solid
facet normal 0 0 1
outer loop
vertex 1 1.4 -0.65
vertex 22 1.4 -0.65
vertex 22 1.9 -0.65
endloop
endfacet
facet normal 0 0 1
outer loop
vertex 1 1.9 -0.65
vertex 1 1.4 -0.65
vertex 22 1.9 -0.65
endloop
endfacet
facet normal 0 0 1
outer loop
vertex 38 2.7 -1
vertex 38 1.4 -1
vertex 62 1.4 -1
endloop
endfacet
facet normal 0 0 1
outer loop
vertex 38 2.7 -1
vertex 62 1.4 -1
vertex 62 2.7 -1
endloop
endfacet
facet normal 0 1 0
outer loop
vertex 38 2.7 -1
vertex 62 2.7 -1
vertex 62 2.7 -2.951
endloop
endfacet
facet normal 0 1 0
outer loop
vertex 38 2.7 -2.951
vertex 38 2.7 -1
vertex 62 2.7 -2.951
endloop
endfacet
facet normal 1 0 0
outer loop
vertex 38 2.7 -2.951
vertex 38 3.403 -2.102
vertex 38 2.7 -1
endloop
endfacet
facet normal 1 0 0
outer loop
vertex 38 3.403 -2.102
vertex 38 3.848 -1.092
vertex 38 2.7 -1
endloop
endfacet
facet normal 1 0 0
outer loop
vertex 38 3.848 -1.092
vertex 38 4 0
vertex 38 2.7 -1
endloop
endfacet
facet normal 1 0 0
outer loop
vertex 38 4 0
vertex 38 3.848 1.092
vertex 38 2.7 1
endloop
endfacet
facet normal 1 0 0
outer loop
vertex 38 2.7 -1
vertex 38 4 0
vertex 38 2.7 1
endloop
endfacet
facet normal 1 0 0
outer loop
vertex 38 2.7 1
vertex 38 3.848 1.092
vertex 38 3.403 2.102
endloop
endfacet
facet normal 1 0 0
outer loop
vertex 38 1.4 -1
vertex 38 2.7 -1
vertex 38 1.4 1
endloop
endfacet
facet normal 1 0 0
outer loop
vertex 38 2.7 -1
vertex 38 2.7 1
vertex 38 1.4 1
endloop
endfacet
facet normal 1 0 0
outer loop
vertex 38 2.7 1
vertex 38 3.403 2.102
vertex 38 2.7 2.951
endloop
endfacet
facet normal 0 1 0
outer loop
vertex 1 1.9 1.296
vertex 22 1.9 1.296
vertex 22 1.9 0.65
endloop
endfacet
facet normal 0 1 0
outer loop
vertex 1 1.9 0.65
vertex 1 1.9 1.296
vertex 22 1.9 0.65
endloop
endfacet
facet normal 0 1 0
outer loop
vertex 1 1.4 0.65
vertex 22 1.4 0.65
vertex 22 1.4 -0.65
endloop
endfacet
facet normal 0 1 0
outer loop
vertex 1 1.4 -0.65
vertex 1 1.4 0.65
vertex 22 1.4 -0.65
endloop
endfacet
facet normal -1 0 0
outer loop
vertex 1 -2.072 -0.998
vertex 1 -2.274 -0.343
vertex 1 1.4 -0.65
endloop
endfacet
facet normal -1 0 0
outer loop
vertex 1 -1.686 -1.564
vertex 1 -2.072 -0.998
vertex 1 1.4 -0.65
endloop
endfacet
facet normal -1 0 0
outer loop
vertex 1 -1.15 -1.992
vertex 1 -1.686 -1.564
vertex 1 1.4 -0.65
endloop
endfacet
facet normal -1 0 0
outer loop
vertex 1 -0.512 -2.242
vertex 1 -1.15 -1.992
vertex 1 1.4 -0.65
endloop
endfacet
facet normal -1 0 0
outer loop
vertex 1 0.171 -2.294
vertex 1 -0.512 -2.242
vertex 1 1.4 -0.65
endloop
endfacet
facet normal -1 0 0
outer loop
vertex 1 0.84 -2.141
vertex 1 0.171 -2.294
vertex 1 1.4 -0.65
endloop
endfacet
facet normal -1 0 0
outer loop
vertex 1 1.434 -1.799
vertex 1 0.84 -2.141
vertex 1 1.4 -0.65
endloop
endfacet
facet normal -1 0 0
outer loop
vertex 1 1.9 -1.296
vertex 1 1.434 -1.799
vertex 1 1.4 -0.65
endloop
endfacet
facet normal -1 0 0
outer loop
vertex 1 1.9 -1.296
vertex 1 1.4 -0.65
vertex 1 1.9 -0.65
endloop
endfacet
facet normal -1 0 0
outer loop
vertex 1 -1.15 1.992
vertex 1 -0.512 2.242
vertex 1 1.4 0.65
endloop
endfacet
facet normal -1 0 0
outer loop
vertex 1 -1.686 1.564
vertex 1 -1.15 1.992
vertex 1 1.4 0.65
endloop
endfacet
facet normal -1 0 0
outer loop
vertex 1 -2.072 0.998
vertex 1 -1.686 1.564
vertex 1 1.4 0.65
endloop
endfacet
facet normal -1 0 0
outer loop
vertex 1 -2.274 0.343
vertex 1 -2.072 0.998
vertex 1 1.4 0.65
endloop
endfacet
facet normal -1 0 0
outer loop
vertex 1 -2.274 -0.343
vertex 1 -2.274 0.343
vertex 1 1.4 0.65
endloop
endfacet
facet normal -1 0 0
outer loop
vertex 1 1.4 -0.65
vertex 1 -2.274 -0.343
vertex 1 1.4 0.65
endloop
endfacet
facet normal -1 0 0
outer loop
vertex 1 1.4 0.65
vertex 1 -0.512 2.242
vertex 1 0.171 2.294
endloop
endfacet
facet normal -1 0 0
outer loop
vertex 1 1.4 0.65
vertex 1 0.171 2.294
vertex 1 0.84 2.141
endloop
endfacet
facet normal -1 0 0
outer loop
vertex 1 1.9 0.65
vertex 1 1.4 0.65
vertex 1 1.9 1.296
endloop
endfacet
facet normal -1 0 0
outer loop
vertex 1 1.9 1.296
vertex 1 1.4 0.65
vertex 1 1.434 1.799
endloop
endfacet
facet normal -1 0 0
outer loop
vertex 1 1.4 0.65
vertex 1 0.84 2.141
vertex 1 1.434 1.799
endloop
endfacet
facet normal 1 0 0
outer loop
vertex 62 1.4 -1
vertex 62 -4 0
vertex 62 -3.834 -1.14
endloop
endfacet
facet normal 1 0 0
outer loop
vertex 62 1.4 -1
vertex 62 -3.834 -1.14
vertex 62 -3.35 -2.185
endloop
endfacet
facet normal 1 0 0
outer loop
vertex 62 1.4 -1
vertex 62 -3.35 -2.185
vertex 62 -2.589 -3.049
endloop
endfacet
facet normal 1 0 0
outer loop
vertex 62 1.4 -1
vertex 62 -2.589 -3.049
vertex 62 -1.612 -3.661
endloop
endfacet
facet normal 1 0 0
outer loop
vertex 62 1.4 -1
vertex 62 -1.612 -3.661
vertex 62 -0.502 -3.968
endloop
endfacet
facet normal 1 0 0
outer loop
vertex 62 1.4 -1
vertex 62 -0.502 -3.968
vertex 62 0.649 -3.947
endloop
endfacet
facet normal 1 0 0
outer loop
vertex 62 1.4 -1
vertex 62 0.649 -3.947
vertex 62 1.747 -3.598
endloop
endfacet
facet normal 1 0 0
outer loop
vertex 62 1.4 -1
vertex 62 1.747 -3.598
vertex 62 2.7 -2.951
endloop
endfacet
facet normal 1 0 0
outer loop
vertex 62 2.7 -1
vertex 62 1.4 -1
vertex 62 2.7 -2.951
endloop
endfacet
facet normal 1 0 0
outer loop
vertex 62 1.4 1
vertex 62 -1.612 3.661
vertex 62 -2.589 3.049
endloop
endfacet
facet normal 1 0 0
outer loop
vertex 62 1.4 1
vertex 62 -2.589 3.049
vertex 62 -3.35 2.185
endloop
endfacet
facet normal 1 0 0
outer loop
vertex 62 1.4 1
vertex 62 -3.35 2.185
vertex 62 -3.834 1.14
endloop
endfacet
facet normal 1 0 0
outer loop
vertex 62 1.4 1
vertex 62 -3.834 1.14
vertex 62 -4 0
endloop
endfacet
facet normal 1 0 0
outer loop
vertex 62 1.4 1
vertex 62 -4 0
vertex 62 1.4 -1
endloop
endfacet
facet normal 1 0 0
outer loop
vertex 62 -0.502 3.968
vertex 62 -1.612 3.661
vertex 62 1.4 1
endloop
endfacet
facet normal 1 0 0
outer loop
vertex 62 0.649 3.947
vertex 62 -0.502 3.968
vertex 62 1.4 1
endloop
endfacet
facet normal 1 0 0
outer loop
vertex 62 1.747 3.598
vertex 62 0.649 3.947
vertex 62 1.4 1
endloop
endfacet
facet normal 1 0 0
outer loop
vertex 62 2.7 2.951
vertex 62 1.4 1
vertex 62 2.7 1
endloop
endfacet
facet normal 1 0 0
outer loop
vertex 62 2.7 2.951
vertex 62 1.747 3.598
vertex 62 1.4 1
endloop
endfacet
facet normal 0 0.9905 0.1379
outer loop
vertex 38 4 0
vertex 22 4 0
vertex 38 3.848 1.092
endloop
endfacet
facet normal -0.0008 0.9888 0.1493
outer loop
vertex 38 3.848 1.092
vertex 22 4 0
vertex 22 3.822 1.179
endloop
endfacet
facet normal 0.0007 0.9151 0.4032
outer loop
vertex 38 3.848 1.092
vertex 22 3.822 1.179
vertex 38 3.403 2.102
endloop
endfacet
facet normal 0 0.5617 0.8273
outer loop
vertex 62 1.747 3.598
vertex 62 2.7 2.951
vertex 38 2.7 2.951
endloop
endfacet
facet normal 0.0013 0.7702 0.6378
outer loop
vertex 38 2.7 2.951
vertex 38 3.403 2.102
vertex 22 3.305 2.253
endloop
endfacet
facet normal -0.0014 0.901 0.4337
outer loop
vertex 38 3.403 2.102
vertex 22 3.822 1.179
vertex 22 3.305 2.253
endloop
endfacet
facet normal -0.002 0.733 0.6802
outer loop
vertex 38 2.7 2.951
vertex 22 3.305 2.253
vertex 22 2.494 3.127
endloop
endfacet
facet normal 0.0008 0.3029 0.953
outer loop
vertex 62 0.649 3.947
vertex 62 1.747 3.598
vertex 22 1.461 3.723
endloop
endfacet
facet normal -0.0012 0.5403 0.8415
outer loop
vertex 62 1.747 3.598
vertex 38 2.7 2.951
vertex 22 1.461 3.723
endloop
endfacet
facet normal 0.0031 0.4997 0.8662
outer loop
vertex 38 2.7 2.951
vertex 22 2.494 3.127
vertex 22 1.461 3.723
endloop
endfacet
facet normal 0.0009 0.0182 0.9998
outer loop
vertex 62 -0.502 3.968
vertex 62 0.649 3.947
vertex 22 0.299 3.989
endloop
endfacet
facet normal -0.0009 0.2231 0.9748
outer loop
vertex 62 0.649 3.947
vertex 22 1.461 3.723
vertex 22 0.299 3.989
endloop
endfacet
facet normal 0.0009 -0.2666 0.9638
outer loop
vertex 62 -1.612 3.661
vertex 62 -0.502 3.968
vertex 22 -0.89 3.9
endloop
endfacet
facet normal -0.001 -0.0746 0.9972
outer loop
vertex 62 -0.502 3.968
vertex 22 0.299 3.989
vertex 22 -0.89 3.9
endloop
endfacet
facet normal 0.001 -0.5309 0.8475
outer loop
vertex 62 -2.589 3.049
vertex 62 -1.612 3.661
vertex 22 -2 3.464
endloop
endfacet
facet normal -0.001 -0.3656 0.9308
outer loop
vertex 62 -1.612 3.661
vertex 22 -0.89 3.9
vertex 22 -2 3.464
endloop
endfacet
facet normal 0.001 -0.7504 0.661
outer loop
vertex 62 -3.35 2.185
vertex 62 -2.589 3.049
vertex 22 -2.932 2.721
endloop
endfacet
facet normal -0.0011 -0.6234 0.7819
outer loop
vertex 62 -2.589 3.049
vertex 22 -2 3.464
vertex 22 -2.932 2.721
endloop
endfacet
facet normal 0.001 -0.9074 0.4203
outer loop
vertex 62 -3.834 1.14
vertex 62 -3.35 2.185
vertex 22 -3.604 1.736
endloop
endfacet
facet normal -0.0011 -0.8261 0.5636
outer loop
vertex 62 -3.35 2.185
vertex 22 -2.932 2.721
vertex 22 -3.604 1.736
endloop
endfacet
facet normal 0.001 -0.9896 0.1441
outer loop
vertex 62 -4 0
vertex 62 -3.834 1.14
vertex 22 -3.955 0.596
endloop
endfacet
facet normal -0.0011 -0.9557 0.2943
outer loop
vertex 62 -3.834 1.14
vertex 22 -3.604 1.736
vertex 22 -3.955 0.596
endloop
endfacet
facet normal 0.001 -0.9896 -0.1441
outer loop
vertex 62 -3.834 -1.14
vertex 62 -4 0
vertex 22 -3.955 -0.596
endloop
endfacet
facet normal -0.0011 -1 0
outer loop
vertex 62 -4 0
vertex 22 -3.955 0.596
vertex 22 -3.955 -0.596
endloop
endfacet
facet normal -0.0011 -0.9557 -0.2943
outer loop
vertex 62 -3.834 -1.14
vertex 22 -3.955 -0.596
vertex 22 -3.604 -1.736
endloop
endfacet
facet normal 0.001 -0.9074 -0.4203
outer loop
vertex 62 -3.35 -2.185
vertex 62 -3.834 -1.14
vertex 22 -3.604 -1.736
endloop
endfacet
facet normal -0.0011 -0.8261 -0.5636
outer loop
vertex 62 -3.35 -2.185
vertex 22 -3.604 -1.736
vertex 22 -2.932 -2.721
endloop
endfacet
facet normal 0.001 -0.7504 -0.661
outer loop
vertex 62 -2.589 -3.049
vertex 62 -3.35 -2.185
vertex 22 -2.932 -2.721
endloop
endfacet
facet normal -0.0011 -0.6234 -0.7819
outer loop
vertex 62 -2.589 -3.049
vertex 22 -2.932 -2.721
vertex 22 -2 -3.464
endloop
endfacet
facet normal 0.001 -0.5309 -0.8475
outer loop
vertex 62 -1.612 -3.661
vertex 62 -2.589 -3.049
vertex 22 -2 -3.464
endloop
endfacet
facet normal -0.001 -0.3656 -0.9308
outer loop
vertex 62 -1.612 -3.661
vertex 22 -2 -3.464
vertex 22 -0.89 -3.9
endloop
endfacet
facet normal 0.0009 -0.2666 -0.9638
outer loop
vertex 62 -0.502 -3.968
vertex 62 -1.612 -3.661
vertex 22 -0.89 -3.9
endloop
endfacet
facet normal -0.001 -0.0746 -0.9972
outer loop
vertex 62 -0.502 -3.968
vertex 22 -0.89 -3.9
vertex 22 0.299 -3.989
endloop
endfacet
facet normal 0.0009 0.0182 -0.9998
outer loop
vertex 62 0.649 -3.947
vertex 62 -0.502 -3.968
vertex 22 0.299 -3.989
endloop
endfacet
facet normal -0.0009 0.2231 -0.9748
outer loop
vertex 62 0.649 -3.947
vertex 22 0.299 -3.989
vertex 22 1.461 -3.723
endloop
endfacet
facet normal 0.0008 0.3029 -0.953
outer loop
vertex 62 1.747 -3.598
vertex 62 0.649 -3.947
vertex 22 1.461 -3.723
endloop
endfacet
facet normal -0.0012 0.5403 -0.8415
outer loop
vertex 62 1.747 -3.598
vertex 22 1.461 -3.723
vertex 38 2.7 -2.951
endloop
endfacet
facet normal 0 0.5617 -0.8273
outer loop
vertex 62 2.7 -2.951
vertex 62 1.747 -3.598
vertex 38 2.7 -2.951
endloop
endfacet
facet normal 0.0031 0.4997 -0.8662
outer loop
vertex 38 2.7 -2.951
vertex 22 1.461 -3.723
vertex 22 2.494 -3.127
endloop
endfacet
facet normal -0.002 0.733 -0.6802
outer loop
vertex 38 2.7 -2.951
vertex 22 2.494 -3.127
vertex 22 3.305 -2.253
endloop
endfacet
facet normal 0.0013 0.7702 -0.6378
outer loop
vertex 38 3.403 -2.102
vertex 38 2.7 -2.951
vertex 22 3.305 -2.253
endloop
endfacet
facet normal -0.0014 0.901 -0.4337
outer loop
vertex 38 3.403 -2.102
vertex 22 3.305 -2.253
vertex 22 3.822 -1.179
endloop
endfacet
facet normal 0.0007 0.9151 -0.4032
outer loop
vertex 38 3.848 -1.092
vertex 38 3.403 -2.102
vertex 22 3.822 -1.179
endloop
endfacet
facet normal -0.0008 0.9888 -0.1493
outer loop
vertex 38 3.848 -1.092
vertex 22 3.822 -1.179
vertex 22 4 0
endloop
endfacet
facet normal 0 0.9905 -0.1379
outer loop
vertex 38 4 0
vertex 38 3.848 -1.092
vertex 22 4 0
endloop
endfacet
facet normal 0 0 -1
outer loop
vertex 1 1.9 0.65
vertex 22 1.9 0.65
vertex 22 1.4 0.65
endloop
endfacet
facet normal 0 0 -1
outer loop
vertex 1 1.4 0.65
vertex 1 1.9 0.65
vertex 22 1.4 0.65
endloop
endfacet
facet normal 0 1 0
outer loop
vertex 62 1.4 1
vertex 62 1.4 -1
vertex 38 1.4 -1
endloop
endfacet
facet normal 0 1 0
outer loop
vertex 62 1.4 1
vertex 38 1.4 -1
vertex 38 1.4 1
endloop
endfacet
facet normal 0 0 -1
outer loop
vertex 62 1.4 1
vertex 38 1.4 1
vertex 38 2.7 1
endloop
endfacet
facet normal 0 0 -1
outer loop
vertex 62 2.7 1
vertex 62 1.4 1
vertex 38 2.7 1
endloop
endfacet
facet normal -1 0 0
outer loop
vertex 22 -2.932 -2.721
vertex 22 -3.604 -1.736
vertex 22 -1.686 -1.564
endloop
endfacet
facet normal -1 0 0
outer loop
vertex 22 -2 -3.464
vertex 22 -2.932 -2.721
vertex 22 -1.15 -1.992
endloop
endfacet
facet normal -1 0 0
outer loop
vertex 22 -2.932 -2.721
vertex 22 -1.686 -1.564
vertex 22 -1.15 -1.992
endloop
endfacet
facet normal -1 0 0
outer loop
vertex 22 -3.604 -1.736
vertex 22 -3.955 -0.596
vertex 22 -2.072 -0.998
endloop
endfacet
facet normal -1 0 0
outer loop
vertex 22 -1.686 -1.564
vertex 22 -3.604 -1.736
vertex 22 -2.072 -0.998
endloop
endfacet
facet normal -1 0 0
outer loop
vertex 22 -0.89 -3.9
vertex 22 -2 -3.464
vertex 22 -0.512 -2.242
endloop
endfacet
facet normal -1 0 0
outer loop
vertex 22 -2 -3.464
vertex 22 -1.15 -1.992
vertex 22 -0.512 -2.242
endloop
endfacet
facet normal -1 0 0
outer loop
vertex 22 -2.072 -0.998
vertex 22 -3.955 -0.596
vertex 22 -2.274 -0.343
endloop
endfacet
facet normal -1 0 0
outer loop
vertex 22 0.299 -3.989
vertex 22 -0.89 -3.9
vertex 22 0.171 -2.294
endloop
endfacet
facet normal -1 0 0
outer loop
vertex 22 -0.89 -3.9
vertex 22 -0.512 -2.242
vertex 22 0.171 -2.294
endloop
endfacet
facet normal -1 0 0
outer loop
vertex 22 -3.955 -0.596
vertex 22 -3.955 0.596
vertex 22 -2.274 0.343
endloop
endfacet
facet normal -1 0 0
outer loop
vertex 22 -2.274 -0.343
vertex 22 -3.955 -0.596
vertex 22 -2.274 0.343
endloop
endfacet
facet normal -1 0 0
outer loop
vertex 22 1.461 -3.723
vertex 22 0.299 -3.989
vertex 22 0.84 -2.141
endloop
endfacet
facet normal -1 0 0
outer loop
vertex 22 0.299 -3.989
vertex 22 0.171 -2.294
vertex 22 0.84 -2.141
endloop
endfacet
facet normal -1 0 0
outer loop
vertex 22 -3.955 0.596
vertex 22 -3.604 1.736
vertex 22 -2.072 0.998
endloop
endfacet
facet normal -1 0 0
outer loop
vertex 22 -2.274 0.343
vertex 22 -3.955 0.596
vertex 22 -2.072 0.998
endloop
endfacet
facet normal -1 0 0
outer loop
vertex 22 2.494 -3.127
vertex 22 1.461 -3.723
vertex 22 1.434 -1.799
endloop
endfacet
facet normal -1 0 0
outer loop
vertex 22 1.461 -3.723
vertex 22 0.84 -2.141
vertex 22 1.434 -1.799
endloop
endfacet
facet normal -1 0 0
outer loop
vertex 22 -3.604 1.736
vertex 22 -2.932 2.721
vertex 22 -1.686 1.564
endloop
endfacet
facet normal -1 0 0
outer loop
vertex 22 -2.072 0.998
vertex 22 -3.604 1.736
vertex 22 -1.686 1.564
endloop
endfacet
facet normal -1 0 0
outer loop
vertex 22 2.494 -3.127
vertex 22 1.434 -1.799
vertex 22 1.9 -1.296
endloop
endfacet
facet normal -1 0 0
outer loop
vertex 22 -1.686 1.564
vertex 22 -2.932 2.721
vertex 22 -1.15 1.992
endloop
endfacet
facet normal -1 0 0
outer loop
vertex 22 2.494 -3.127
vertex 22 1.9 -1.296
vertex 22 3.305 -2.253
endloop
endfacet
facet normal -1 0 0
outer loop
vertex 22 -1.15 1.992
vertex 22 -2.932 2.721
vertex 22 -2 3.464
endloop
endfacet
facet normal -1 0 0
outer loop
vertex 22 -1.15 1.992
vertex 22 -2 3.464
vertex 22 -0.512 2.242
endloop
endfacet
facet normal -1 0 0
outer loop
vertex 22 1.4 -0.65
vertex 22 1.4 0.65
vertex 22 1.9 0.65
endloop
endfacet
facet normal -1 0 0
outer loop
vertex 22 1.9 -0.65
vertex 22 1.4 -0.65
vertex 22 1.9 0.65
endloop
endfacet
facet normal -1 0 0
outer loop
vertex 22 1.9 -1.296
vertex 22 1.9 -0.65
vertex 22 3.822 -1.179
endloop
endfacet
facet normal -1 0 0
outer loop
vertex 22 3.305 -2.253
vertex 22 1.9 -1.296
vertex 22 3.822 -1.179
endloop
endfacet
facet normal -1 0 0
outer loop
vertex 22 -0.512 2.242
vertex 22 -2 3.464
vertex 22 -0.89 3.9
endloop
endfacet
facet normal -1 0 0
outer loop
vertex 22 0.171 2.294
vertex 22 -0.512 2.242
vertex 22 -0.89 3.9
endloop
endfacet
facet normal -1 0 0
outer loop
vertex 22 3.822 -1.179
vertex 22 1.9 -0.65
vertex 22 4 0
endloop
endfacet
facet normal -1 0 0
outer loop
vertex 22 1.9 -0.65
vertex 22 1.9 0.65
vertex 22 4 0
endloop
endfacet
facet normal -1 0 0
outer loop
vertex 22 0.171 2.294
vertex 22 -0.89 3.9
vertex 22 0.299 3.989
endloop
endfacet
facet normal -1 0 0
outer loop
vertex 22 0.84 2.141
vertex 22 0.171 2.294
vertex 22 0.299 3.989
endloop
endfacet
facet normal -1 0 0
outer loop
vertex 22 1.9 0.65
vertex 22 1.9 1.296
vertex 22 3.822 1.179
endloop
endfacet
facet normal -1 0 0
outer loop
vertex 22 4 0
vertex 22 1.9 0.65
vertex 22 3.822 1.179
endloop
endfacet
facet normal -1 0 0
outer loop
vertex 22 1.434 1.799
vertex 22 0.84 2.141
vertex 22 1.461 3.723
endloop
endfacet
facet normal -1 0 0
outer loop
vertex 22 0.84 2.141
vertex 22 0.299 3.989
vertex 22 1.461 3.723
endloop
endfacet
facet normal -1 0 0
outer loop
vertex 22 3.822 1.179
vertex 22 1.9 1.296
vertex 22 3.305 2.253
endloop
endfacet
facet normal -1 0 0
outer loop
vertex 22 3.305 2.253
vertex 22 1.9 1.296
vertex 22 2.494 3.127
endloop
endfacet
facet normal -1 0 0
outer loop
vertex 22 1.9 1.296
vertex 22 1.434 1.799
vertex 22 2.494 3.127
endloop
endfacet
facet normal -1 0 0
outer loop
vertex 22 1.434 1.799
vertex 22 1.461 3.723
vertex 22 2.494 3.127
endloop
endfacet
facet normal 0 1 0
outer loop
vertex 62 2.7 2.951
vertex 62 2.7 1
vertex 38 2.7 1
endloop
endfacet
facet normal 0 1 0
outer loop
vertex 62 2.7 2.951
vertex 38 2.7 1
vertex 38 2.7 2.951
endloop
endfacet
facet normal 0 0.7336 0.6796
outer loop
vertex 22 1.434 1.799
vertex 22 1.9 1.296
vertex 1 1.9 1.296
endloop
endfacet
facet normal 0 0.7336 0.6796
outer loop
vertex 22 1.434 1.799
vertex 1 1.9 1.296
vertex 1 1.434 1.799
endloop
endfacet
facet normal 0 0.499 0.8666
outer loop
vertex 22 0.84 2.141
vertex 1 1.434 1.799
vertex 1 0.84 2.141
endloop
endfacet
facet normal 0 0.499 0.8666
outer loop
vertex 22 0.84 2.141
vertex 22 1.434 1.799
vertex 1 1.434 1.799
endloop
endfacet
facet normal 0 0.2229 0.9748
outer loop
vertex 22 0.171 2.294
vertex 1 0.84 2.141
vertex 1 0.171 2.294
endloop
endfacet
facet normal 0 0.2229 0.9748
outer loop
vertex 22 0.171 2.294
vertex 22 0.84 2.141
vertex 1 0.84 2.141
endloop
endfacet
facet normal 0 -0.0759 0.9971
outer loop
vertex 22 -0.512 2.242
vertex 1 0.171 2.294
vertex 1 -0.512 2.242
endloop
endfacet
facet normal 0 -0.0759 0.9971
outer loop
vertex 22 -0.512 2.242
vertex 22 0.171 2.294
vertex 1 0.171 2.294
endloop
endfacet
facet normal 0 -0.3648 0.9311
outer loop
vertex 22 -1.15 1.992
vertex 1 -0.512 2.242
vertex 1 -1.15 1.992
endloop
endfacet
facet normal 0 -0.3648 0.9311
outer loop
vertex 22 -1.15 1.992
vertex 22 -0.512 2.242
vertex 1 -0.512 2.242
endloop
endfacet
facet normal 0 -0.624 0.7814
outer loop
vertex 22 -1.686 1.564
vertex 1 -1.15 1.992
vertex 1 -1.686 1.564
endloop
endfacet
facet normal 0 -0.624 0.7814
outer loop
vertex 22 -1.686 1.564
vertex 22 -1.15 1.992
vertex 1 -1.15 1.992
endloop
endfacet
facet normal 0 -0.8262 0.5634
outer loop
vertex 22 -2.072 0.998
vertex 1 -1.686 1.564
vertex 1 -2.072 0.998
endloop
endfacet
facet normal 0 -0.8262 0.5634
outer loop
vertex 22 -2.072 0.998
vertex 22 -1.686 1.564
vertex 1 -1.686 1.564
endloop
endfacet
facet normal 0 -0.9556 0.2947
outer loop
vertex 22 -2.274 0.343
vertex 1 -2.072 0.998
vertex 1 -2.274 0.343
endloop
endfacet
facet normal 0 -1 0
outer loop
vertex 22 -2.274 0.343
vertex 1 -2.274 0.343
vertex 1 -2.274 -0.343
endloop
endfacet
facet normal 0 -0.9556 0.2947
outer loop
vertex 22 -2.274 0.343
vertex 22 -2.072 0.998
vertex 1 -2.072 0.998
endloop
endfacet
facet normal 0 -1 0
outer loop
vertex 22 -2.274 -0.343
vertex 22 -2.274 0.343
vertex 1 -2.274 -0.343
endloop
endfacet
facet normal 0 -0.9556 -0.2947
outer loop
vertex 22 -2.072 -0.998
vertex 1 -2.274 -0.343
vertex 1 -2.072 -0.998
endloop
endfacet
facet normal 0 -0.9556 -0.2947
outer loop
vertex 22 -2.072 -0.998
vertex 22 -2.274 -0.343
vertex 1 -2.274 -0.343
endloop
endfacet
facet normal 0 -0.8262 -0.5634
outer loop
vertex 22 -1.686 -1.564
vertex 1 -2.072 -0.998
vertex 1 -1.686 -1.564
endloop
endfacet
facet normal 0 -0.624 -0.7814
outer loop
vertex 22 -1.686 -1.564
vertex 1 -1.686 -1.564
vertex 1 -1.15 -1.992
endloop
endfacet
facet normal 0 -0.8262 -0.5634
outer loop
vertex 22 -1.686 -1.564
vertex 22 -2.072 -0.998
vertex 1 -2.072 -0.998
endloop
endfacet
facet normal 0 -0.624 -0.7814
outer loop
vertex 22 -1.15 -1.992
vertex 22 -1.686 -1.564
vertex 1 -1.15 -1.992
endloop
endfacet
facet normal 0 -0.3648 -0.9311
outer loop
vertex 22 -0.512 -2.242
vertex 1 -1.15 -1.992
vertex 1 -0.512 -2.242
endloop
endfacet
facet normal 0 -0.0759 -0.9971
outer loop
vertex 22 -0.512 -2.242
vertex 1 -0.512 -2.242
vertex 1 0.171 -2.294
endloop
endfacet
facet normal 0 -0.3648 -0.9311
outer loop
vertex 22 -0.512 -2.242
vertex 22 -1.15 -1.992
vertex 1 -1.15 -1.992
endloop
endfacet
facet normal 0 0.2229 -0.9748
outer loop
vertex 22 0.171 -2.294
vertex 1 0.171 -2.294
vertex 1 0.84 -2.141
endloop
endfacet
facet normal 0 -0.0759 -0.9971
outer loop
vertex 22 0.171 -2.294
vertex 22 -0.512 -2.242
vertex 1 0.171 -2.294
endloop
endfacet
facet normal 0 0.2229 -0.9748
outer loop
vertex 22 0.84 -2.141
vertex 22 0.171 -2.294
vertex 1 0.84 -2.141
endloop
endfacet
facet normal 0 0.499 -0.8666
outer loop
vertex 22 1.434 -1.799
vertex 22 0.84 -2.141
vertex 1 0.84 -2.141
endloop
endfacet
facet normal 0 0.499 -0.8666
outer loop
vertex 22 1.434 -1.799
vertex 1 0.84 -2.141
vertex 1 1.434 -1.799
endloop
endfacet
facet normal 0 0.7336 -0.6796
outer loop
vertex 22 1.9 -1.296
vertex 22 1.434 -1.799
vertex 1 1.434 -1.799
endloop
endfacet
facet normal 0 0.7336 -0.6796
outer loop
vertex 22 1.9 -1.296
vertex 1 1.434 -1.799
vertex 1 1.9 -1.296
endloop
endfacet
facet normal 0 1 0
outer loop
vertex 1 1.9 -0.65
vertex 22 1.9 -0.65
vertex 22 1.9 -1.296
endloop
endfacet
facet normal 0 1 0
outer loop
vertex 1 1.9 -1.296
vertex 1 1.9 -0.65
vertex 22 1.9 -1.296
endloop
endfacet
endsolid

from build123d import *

# Parameters (mm, degrees)
SKETCH009_R     = 4
PAD002_DEPTH    = 40
PAD004_DEPTH    = 21
POCKET007_DEPTH = 24


with BuildPart() as part:
    # Sketch009 → Pad002 (new body)
    with BuildSketch(Plane.YZ):
        Circle(SKETCH009_R)
    extrude(amount=PAD002_DEPTH)

    # Sketch011 → Pad004 (join)
    with BuildSketch(Plane.YZ):
        with BuildLine():
            ThreePointArc((1.9, 1.296148), (-2.3, 0), (1.9, -1.296148))
            Line((1.9, -0.65), (1.9, -1.296148))
            Line((1.4, -0.65), (1.9, -0.65))
            Line((1.4, 0.65), (1.4, -0.65))
            Line((1.9, 0.65), (1.4, 0.65))
            Line((1.9, 1.296148), (1.9, 0.65))
        make_face()
    extrude(amount=-PAD004_DEPTH)

    # Sketch021 (on Face3 of Pad004) → Pocket007 (cut)
    with BuildSketch(Plane.YZ.offset(40)):
        with BuildLine():
            Line((1.4, -1), (1.4, 1))
            Line((1.4, 1), (2.7, 1))
            Line((2.7, 1), (2.7, 2.951271))
            ThreePointArc((2.7, -2.951271), (4, 0), (2.7, 2.951271))
            Line((2.7, -1), (2.7, -2.951271))
            Line((1.4, -1), (2.7, -1))
        make_face()
    extrude(amount=-POCKET007_DEPTH, mode=Mode.SUBTRACT)


with BuildPart() as part_1:
    # Body002 placement: moved
    add(part.part.moved(Location((22, 0, 0))))


solid = part_1.part
